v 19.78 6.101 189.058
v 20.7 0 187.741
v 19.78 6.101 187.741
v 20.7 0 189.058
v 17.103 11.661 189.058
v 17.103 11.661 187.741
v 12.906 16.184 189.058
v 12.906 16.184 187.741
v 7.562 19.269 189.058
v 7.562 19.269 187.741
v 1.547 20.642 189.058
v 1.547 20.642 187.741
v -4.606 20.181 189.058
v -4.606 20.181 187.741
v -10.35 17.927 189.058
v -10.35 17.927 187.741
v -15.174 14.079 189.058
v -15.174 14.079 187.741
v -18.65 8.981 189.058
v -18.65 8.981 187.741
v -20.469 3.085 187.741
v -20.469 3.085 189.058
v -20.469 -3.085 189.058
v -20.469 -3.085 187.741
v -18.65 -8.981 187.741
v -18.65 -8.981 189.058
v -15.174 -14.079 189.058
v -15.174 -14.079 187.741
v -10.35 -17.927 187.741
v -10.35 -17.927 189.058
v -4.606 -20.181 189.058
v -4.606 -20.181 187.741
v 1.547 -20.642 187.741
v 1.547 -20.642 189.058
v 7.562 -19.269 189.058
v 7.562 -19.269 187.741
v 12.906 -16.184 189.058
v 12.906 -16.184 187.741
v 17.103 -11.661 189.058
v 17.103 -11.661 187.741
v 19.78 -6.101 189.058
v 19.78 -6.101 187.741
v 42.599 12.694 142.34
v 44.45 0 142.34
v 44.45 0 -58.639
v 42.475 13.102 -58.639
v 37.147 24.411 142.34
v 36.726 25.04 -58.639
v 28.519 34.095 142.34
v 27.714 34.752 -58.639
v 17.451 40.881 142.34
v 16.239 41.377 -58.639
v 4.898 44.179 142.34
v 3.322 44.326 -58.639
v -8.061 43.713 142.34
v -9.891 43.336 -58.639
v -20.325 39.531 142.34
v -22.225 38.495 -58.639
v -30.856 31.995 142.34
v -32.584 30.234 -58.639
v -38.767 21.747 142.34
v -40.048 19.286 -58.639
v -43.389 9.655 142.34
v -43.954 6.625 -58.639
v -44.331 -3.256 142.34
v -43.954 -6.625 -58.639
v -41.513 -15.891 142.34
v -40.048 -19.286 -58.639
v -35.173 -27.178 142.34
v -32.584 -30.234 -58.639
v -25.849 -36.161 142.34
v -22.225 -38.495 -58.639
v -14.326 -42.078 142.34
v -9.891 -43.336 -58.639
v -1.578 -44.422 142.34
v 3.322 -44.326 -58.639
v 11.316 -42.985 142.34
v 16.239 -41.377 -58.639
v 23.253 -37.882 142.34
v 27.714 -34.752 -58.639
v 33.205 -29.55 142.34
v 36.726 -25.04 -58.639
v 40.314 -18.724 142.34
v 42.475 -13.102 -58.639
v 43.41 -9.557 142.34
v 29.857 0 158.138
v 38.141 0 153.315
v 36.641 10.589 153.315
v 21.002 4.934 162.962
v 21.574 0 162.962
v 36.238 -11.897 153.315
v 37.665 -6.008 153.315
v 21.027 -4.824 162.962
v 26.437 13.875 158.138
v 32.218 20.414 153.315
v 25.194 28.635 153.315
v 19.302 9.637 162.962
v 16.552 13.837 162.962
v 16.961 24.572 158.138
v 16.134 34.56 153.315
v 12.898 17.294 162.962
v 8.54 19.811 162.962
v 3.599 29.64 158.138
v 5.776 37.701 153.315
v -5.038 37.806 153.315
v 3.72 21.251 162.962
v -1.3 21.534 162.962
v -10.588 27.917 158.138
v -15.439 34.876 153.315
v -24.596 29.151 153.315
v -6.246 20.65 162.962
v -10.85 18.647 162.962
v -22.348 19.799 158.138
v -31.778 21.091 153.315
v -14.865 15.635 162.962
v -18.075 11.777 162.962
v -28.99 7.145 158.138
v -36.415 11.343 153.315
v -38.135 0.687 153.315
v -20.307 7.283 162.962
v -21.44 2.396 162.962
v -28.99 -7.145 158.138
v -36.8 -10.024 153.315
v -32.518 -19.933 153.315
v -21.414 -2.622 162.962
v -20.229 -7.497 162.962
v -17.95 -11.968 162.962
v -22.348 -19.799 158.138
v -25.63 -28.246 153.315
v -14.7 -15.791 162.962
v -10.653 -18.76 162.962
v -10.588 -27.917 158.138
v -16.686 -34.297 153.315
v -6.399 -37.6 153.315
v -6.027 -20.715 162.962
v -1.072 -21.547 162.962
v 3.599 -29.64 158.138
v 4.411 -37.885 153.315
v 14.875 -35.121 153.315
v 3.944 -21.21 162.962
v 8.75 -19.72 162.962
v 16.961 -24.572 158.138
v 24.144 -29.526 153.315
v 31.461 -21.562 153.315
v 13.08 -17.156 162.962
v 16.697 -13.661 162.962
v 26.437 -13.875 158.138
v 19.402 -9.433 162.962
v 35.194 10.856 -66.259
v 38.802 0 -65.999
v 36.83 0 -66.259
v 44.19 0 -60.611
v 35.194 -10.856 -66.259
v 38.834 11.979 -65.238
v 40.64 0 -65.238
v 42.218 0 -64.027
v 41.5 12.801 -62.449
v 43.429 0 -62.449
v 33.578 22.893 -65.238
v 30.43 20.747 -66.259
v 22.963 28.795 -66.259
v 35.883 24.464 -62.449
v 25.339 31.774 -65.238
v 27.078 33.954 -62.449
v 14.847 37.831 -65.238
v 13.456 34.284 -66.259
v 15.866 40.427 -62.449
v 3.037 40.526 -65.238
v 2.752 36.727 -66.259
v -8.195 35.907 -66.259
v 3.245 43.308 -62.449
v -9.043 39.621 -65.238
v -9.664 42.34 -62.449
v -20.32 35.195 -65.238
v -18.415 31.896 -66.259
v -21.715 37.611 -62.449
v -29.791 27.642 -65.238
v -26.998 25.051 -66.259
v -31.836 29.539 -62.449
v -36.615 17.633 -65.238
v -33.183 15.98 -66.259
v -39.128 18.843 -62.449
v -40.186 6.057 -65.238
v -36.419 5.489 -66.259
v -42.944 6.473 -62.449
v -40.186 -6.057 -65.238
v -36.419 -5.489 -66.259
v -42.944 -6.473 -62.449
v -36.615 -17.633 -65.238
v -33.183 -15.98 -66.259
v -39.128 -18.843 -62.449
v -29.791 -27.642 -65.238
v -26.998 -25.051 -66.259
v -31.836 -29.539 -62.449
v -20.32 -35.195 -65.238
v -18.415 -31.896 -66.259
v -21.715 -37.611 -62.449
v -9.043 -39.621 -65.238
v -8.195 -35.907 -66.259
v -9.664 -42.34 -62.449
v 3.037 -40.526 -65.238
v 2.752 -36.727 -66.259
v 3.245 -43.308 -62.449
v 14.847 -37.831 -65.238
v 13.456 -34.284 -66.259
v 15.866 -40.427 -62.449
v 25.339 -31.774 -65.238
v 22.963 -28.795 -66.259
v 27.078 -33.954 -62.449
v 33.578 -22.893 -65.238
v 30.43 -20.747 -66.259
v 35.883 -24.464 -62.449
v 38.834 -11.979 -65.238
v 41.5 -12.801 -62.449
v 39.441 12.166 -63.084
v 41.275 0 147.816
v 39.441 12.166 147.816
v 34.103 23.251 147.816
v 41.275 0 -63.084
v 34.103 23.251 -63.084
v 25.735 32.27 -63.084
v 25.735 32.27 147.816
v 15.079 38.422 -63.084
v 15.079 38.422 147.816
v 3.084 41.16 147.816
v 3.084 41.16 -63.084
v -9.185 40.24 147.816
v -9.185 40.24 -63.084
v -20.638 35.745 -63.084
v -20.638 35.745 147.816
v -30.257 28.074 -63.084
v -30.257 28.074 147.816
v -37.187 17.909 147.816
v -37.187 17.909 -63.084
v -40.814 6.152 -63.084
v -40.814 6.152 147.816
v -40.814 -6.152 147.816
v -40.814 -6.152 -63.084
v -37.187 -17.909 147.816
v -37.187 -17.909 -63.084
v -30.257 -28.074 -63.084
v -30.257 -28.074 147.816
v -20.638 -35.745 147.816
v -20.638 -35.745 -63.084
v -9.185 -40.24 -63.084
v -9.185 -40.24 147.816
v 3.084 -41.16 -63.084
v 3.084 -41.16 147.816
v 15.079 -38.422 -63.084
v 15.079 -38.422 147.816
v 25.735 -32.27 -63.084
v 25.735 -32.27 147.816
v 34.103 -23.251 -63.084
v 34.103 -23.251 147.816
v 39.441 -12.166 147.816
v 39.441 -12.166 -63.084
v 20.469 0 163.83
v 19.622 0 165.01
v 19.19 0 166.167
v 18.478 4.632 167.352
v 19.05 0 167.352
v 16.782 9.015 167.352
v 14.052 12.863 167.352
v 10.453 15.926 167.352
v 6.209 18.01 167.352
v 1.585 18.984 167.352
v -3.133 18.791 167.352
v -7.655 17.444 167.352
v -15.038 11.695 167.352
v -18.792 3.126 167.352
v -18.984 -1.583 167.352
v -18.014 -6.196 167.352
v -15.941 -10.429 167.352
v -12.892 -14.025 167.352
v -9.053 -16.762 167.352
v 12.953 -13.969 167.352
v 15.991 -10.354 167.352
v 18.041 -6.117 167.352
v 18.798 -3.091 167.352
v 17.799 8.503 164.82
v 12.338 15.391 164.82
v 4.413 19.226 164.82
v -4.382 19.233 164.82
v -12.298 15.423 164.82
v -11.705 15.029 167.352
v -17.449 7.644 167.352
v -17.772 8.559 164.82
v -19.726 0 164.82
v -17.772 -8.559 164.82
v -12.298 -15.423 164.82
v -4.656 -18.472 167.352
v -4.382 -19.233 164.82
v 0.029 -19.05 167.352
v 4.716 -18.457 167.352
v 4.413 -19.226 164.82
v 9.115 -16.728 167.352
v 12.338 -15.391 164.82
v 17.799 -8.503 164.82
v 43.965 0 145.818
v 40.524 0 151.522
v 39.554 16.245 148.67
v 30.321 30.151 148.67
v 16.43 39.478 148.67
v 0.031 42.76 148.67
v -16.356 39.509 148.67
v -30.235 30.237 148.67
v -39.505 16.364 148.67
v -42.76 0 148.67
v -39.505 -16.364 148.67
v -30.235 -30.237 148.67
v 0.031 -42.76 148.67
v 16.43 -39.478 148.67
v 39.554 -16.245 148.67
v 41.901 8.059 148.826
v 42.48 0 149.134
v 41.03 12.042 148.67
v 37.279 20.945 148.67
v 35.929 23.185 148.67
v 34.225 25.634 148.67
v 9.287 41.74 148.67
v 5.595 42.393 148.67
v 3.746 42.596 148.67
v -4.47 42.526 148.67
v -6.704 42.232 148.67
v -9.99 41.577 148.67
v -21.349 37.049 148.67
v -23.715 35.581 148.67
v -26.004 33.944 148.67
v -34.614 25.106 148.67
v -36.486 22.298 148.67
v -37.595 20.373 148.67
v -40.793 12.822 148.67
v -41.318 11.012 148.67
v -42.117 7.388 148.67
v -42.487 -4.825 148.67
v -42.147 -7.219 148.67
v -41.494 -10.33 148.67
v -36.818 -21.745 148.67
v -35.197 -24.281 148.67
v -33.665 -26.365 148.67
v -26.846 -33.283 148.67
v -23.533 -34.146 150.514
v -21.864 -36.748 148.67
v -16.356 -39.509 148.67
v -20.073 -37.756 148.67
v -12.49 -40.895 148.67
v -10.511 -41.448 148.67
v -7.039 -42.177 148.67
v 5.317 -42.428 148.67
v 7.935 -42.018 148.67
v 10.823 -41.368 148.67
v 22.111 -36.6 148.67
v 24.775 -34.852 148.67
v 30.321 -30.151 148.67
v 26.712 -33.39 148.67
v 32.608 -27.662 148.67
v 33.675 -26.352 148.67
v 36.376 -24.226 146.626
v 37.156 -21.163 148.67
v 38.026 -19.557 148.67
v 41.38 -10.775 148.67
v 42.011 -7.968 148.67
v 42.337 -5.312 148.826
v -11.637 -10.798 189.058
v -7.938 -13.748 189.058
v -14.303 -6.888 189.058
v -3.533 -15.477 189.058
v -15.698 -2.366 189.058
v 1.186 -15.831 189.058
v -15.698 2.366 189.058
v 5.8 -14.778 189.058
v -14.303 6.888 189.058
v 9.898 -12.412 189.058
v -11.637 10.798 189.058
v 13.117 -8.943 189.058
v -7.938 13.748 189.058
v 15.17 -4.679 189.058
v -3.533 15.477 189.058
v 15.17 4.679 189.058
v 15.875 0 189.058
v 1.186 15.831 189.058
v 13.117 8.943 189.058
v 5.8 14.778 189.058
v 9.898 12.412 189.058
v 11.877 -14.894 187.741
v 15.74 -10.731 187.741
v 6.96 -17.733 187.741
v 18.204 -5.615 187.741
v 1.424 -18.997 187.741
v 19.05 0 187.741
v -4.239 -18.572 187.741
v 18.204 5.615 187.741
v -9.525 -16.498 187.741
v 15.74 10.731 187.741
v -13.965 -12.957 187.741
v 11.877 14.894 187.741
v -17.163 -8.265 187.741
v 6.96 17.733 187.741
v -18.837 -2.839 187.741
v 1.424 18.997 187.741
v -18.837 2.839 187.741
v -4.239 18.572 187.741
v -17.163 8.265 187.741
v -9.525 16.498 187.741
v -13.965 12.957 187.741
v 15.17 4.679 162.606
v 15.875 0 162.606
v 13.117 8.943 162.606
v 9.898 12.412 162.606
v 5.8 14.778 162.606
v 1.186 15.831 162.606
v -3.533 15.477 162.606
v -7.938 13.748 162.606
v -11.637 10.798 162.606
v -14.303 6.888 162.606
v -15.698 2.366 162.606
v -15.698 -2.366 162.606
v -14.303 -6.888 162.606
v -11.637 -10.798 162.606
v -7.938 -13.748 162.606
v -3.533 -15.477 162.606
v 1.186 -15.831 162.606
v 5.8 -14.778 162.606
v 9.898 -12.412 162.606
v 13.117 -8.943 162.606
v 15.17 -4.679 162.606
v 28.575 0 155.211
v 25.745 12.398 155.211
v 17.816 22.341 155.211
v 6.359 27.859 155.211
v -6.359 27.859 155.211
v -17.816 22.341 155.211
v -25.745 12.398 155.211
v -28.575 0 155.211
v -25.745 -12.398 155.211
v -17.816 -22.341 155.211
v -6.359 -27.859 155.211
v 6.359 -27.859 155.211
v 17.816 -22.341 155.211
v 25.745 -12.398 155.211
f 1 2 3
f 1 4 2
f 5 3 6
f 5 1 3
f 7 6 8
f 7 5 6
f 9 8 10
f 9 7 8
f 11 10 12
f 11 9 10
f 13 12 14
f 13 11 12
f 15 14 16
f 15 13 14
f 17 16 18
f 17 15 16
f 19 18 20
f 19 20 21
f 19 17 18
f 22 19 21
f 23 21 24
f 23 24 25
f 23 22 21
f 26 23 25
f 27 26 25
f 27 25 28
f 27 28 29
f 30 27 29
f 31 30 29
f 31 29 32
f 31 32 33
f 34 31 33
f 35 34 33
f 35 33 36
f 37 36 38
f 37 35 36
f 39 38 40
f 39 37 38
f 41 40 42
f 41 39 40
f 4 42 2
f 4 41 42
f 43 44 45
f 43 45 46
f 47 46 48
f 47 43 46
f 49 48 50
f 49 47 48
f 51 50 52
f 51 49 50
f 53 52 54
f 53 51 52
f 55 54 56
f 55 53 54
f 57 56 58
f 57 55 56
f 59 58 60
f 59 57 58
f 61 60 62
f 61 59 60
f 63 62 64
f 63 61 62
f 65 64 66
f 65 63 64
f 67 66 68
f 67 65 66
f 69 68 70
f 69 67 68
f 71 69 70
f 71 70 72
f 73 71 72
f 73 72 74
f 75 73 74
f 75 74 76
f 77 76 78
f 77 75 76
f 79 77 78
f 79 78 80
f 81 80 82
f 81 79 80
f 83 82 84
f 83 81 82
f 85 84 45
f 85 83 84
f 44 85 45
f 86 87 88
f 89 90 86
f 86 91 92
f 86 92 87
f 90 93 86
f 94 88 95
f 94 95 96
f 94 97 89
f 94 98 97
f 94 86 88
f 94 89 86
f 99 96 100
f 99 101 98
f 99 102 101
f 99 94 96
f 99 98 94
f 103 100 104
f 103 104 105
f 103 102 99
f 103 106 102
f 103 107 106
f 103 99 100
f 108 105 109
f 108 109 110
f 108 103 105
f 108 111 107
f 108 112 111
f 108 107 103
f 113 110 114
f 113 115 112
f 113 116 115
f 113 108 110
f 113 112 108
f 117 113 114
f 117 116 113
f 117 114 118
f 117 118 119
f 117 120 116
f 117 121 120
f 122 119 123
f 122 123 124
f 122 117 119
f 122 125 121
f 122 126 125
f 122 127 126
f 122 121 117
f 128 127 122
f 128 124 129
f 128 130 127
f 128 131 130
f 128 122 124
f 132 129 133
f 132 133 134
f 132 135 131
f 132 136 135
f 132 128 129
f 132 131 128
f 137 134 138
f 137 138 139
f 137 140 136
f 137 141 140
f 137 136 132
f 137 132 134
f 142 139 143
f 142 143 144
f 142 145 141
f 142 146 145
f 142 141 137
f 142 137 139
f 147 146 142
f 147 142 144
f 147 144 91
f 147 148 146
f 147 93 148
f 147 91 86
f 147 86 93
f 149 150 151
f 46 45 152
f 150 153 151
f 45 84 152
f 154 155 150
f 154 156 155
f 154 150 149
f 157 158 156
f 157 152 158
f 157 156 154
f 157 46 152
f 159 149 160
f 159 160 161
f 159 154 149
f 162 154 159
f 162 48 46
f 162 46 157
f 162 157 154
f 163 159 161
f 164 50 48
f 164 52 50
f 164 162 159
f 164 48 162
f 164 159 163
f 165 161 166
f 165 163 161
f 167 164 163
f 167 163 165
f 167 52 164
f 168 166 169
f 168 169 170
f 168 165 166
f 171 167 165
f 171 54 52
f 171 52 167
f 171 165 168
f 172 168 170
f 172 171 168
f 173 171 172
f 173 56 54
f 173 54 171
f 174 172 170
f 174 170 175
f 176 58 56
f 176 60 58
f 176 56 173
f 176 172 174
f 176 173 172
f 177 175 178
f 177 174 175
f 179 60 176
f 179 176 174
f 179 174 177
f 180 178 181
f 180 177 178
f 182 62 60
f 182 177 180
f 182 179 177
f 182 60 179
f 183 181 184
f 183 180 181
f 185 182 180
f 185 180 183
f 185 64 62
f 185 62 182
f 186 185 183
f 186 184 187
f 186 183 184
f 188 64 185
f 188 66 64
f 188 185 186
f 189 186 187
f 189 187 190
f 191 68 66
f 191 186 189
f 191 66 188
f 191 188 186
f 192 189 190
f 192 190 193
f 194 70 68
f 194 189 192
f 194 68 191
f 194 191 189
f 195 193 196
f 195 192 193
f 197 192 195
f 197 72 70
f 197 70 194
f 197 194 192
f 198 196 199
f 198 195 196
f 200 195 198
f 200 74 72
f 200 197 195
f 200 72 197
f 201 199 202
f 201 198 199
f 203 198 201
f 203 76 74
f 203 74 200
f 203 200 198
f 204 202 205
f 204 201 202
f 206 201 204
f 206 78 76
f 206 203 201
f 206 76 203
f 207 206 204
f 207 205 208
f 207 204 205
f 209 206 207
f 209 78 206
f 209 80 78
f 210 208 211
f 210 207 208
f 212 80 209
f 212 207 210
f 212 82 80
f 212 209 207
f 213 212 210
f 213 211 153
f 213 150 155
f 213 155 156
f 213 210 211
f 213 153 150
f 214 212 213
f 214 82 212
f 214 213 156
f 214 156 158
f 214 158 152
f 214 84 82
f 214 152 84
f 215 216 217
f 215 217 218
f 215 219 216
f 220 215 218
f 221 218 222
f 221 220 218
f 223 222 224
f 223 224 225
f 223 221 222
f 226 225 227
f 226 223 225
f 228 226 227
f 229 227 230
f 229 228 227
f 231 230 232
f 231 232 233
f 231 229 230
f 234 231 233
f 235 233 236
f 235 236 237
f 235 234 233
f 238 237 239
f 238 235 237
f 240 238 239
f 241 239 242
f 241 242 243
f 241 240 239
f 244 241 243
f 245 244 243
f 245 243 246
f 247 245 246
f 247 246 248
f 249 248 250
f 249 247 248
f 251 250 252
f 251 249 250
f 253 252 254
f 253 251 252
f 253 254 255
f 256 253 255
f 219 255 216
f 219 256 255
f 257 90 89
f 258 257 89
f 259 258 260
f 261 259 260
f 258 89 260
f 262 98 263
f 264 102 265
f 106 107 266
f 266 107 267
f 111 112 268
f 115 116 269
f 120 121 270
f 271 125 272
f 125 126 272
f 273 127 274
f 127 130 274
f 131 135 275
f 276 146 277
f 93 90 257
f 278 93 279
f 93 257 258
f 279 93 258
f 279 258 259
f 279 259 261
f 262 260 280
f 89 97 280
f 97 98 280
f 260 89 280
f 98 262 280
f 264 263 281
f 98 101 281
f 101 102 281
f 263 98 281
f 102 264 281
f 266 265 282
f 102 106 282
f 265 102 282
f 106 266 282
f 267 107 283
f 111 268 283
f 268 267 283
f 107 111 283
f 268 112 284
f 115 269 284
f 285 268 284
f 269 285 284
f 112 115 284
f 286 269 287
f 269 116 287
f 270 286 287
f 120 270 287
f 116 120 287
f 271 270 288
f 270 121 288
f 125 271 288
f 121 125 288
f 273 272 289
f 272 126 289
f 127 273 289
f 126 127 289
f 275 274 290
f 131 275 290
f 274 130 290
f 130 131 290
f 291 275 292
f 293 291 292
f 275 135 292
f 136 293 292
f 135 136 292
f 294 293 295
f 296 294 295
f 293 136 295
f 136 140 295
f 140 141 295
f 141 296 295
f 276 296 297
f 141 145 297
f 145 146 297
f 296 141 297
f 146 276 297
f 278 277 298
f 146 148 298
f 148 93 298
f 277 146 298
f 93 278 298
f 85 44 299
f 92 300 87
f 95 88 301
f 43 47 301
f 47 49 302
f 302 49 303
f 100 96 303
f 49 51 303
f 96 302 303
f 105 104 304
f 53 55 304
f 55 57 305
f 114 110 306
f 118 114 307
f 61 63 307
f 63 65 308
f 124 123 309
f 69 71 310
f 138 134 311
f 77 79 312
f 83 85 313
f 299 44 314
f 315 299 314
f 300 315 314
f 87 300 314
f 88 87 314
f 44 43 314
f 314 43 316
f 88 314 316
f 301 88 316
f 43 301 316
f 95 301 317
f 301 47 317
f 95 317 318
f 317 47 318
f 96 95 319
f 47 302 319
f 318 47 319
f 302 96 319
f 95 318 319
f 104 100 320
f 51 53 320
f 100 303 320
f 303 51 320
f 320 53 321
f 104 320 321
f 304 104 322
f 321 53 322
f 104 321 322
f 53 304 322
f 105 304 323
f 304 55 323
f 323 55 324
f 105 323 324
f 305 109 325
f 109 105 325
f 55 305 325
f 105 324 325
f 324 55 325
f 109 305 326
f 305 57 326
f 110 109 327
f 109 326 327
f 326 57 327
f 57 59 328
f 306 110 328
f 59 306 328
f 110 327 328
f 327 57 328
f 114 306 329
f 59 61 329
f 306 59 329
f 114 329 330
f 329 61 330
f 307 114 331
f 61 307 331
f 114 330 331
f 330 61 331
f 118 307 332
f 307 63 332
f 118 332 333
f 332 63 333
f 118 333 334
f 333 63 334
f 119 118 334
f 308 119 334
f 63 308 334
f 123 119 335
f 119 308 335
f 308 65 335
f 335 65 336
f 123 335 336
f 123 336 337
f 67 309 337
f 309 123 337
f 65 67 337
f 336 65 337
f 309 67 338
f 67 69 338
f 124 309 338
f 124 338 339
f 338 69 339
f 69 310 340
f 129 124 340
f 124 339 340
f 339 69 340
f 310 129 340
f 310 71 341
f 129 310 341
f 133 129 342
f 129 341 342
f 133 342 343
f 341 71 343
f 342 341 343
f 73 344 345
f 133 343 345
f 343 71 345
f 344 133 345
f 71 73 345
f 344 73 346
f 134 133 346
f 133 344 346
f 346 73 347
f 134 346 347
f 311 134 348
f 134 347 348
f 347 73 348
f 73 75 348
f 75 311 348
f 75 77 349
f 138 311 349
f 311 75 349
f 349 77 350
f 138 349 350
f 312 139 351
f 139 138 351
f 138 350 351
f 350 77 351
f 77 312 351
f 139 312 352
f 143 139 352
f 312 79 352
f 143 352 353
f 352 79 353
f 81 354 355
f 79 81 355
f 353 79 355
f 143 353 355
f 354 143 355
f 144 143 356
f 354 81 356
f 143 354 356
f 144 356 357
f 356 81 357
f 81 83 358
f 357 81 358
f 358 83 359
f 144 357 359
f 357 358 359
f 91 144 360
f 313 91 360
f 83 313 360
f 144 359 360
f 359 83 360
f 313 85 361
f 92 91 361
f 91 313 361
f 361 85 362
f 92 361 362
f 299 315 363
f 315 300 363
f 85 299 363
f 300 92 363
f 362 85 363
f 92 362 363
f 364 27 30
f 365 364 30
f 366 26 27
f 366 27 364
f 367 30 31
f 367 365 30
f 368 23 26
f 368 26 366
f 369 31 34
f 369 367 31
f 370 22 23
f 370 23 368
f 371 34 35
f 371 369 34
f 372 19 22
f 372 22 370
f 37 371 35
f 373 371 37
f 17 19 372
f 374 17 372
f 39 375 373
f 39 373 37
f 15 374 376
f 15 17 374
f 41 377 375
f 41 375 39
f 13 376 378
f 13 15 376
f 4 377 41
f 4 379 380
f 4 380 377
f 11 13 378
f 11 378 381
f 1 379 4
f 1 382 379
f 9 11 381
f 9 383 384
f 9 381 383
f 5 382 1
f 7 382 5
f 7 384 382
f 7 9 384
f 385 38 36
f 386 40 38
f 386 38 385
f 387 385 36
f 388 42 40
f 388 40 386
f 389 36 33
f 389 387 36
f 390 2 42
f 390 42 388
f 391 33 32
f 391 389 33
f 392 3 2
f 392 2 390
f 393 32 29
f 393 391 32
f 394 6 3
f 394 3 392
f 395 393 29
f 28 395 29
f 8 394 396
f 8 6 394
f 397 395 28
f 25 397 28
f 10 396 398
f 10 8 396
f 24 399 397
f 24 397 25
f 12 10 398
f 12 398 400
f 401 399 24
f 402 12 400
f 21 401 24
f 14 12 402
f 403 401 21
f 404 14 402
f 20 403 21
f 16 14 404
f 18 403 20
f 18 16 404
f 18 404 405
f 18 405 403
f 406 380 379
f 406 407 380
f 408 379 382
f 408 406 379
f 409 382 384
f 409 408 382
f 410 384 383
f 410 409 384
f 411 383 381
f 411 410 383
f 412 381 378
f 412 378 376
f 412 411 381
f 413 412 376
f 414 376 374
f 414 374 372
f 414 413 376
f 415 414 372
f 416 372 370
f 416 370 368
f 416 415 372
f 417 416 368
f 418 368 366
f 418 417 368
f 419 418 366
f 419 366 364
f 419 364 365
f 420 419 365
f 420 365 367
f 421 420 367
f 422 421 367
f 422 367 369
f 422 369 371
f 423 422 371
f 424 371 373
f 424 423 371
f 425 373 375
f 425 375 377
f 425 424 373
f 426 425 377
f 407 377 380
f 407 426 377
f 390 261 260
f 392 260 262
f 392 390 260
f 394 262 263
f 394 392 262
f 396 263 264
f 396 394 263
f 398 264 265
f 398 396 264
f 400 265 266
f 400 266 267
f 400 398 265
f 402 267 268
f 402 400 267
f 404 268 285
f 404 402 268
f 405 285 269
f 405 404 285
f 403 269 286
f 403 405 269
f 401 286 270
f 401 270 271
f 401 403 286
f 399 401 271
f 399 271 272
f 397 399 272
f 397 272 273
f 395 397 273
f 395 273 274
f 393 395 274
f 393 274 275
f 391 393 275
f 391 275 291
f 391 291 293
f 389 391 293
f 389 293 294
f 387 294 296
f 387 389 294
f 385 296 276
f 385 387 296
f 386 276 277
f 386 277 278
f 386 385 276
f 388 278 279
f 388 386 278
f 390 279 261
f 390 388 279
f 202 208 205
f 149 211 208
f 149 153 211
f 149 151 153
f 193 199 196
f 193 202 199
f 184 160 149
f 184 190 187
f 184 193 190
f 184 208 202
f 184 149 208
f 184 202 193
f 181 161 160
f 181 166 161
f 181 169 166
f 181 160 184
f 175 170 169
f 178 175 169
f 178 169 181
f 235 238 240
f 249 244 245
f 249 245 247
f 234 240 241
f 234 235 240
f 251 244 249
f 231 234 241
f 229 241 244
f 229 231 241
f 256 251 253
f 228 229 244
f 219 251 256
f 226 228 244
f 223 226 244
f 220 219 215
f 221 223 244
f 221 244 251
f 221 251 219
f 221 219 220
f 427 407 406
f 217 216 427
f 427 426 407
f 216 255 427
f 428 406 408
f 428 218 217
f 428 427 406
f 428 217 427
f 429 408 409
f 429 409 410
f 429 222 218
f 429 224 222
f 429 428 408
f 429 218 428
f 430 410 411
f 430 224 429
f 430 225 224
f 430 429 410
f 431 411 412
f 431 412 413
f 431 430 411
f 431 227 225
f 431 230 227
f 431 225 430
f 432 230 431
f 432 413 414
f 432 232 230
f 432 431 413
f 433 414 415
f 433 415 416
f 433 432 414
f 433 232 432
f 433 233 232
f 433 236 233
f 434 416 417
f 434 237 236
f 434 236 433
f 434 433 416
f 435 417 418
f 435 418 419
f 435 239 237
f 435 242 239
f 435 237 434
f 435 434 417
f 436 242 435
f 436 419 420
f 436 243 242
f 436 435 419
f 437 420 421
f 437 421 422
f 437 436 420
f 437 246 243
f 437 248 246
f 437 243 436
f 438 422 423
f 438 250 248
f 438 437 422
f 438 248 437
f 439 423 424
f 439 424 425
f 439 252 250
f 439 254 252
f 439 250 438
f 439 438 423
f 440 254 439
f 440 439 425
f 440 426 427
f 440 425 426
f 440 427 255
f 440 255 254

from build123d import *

# Parameters (mm, degrees)
F3_R = 7.62
F4_R = 12.7
F5_R = 5.08


with BuildPart() as f2:
    # F0 (on Front) → F2 (revolve)
    with BuildSketch(Plane.XZ):
        Polygon((0, -63.08393), (0, -66.25893), (44.45, -66.25893), (44.45, 149.64107), (19.05, 164.431536), (19.05, 187.74107), (20.699778, 187.74107), (20.699778, 189.058036), (15.875, 189.058036), (15.875, 162.606284), (41.275, 147.815819), (41.275, -63.08393), align=None)
    revolve(axis=Axis((0, 0, 62.210336), (0, 0, 1)))

    # F3
    f3_edges = [f2.edges().sort_by_distance(p)[0] for p in [
        (-44.45, 0, -66.25893),
    ]]
    fillet(f3_edges, radius=F3_R)

    # F4
    f4_edges = [f2.edges().sort_by_distance(p)[0] for p in [
        (-44.45, 0, 149.64107),
    ]]
    fillet(f4_edges, radius=F4_R)

    # F5
    f5_edges = [f2.edges().sort_by_distance(p)[0] for p in [
        (-19.05, 0, 164.431536),
    ]]
    fillet(f5_edges, radius=F5_R)


solid = f2.part
